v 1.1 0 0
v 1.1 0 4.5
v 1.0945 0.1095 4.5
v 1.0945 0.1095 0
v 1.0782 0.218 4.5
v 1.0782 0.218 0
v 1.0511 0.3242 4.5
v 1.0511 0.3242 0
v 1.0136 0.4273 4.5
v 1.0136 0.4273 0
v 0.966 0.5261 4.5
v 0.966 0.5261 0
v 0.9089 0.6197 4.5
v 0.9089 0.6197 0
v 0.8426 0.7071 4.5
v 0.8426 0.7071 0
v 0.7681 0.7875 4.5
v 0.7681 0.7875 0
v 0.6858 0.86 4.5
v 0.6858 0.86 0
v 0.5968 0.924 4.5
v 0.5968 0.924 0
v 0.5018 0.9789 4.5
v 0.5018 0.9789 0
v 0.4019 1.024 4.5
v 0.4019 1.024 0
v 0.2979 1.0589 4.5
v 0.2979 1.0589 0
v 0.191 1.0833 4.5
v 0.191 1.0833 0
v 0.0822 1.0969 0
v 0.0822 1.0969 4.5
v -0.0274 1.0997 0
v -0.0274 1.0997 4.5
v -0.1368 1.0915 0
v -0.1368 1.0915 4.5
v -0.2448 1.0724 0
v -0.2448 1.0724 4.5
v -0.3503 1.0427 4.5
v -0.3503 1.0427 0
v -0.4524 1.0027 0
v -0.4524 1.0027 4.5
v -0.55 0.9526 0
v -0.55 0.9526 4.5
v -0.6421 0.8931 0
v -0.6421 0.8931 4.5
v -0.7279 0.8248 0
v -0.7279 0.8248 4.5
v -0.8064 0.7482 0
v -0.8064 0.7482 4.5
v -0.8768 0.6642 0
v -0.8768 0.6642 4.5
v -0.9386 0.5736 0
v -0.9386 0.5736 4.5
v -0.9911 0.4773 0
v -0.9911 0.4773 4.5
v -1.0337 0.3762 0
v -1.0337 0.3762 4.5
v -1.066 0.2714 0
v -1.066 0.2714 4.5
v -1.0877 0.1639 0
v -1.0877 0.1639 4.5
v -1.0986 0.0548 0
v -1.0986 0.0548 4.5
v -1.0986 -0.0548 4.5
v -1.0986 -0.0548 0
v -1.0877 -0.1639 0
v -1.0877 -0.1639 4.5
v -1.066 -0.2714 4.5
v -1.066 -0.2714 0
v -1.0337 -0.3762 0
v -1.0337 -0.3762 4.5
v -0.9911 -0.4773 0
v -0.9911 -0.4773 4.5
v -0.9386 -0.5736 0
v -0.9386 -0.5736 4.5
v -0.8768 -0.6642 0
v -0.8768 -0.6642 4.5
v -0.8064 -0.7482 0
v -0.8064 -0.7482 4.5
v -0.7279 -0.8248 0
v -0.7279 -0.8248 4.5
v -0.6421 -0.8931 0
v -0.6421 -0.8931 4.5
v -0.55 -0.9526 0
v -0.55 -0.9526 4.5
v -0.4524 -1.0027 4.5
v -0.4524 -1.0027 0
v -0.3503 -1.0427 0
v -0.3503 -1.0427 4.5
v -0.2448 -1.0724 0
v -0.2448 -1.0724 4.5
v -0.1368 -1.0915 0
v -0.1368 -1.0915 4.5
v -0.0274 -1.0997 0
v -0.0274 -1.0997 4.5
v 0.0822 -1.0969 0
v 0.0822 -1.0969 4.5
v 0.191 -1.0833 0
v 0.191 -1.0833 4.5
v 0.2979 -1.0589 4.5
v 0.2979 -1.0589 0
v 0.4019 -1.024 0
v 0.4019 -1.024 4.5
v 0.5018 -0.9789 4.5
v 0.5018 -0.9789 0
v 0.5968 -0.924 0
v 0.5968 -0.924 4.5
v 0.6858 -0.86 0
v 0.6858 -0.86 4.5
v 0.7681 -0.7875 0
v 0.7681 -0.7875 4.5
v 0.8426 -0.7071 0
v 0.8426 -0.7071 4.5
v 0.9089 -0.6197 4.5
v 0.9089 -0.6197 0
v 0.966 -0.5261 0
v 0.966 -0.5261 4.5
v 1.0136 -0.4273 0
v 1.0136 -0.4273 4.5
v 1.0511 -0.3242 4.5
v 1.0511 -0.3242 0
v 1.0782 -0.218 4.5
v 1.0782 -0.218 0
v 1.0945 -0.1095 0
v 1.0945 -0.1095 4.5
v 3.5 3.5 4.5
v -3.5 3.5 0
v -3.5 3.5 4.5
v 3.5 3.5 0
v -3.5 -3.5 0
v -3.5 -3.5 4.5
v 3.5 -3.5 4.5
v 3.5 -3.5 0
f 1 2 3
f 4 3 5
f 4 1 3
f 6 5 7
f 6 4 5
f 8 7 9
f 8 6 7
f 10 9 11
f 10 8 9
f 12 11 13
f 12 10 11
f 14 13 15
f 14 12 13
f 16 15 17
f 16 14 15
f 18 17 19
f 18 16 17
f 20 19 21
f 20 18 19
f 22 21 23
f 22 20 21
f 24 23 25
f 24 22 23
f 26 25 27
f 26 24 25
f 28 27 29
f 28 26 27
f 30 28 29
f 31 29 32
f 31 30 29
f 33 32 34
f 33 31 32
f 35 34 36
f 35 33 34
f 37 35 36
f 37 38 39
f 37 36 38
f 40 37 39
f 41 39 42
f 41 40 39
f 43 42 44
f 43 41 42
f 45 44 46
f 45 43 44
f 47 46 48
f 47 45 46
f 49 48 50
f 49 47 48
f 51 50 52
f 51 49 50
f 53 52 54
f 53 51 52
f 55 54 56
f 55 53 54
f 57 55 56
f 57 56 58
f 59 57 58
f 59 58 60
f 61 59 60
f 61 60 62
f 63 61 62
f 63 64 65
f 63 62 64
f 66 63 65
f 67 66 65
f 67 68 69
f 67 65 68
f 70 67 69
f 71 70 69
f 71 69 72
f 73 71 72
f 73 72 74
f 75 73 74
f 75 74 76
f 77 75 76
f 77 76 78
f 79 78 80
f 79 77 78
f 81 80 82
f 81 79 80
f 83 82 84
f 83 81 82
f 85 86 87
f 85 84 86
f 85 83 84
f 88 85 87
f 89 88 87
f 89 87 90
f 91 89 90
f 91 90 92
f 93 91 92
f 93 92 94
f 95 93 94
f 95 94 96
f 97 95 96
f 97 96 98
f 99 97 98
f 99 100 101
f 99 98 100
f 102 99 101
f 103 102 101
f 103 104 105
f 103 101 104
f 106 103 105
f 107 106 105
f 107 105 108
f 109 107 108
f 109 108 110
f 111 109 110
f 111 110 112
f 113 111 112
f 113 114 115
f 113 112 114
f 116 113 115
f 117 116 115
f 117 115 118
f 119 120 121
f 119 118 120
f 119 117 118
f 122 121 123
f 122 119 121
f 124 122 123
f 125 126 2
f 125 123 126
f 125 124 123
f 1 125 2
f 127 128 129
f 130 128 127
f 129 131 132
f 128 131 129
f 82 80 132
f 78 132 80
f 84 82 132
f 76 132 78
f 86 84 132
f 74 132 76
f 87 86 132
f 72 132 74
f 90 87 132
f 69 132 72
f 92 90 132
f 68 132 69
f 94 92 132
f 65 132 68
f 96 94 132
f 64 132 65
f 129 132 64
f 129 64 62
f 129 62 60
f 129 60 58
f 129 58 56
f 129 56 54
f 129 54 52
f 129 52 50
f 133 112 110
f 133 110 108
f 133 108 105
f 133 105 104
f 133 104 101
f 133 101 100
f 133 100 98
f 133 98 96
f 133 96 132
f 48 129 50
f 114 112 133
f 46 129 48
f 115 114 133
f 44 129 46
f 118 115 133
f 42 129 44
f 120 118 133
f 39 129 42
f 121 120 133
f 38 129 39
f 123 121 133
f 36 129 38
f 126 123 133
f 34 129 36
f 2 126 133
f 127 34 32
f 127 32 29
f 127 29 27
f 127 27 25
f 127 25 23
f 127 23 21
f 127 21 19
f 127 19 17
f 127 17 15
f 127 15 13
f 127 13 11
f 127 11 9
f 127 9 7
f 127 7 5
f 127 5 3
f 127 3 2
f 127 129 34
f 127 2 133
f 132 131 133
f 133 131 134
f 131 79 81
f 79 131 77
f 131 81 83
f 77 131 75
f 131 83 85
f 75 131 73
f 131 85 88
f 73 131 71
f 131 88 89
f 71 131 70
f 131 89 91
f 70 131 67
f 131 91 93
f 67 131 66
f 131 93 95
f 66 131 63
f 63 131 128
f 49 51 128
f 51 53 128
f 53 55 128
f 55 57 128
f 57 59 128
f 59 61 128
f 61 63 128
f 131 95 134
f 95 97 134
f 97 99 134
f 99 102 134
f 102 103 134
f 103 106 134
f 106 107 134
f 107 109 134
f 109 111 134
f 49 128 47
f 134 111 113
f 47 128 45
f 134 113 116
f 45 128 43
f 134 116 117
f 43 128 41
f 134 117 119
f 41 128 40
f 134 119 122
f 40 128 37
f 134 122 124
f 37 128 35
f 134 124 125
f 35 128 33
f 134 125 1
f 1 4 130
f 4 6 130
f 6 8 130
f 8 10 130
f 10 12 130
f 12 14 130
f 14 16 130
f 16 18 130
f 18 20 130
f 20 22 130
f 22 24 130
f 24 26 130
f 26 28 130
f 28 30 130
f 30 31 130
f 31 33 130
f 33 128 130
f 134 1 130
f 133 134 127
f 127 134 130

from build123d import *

# Parameters (mm, degrees)
CYLINDER_R     = 1.1
CYLINDER_DEPTH = 10
BOX008_W       = 7
BOX008_H       = 7
BOX008_DEPTH   = 4.5


with BuildPart() as hole:
    # Cylinder → Cylinder (new body)
    with BuildSketch(Plane.XY):
        Circle(CYLINDER_R)
    extrude(amount=CYLINDER_DEPTH)


with BuildPart() as stand_hole_cut:
    # Box008 → Box008 (new body)
    with BuildSketch(Plane(origin=(-3.5, -3.5, 0), x_dir=(1, 0, 0), z_dir=(0, 0, 1))):
        with Locations((3.5, 3.5)):
            Rectangle(BOX008_W, BOX008_H)
    extrude(amount=BOX008_DEPTH)

    # Cut003002: cut hole
    add(hole.part, mode=Mode.SUBTRACT)


solid = stand_hole_cut.part
